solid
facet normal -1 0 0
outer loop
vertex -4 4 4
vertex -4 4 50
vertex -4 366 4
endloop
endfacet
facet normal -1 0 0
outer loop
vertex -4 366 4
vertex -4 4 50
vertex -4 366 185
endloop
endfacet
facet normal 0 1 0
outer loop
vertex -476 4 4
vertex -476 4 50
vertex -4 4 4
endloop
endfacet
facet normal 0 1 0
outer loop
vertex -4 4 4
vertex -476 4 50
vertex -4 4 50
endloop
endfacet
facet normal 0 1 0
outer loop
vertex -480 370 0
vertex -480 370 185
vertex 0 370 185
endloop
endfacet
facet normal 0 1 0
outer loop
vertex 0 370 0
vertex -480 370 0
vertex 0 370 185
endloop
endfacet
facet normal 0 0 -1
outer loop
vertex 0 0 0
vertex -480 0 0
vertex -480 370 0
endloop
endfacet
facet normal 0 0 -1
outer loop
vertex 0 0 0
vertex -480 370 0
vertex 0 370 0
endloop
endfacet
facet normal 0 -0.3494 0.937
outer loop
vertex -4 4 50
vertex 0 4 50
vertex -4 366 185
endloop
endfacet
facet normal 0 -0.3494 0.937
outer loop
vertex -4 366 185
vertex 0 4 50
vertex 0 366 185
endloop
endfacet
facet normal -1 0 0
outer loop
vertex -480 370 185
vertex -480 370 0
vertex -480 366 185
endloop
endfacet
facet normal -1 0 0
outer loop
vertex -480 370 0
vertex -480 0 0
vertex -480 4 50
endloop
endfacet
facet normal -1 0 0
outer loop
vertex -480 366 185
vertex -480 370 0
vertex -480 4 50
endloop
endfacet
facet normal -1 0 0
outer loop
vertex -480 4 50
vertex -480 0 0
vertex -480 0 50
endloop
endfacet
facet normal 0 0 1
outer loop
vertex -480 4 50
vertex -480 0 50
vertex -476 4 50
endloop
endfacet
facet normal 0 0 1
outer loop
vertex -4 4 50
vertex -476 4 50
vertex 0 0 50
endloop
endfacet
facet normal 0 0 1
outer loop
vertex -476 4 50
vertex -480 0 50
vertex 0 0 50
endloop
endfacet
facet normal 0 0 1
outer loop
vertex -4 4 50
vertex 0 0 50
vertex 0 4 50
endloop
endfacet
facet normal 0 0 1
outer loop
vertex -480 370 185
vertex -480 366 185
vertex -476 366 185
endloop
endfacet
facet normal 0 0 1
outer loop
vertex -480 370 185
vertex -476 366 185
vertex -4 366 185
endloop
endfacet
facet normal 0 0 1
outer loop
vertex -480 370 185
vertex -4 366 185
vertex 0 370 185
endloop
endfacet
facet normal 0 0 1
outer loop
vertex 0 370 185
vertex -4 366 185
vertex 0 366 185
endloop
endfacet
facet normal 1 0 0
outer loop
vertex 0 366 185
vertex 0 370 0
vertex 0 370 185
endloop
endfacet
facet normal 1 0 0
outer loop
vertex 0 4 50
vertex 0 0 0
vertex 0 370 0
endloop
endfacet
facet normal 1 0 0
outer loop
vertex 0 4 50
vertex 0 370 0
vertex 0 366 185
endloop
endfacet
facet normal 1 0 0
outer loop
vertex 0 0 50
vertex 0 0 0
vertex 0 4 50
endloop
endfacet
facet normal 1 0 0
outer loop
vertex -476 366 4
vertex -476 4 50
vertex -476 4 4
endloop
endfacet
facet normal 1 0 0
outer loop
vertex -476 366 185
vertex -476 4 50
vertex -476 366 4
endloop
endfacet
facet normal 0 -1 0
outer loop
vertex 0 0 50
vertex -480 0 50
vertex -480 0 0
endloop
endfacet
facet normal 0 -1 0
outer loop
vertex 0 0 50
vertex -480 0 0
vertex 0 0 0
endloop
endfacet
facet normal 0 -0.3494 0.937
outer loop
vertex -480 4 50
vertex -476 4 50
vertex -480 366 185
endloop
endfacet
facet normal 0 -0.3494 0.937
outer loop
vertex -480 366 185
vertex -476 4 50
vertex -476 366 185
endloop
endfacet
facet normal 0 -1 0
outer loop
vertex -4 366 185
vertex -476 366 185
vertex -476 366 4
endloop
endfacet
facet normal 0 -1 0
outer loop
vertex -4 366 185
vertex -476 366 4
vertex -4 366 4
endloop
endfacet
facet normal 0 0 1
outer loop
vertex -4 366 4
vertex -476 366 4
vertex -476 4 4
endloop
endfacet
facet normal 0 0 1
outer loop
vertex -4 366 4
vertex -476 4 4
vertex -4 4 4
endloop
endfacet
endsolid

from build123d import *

# Parameters (mm, degrees)
F0_W     = 480
F0_H     = 185
F1_DEPTH = 370
F3_DEPTH = 480
F5_W     = 472
F5_H     = 362
F6_DEPTH = 181


with BuildPart() as f1:
    # F0 (on Front) → F1 (new body)
    with BuildSketch(Plane.XZ):
        with Locations((-240, 92.5)):
            Rectangle(F0_W, F0_H)
    extrude(amount=-F1_DEPTH)

    # F2 (on Right) → F3 (cut, through all)
    with BuildSketch(Plane.YZ):
        Polygon((0, 50), (4, 50), (366, 185), (0, 185), align=None)
    extrude(amount=-F3_DEPTH, mode=Mode.SUBTRACT)

    # F5 (on plane+point) → F6 (cut)
    with BuildSketch(Plane.XY.offset(185)):
        with Locations((-240, 185)):
            Rectangle(F5_W, F5_H)
    extrude(amount=-F6_DEPTH, mode=Mode.SUBTRACT)


solid = f1.part
